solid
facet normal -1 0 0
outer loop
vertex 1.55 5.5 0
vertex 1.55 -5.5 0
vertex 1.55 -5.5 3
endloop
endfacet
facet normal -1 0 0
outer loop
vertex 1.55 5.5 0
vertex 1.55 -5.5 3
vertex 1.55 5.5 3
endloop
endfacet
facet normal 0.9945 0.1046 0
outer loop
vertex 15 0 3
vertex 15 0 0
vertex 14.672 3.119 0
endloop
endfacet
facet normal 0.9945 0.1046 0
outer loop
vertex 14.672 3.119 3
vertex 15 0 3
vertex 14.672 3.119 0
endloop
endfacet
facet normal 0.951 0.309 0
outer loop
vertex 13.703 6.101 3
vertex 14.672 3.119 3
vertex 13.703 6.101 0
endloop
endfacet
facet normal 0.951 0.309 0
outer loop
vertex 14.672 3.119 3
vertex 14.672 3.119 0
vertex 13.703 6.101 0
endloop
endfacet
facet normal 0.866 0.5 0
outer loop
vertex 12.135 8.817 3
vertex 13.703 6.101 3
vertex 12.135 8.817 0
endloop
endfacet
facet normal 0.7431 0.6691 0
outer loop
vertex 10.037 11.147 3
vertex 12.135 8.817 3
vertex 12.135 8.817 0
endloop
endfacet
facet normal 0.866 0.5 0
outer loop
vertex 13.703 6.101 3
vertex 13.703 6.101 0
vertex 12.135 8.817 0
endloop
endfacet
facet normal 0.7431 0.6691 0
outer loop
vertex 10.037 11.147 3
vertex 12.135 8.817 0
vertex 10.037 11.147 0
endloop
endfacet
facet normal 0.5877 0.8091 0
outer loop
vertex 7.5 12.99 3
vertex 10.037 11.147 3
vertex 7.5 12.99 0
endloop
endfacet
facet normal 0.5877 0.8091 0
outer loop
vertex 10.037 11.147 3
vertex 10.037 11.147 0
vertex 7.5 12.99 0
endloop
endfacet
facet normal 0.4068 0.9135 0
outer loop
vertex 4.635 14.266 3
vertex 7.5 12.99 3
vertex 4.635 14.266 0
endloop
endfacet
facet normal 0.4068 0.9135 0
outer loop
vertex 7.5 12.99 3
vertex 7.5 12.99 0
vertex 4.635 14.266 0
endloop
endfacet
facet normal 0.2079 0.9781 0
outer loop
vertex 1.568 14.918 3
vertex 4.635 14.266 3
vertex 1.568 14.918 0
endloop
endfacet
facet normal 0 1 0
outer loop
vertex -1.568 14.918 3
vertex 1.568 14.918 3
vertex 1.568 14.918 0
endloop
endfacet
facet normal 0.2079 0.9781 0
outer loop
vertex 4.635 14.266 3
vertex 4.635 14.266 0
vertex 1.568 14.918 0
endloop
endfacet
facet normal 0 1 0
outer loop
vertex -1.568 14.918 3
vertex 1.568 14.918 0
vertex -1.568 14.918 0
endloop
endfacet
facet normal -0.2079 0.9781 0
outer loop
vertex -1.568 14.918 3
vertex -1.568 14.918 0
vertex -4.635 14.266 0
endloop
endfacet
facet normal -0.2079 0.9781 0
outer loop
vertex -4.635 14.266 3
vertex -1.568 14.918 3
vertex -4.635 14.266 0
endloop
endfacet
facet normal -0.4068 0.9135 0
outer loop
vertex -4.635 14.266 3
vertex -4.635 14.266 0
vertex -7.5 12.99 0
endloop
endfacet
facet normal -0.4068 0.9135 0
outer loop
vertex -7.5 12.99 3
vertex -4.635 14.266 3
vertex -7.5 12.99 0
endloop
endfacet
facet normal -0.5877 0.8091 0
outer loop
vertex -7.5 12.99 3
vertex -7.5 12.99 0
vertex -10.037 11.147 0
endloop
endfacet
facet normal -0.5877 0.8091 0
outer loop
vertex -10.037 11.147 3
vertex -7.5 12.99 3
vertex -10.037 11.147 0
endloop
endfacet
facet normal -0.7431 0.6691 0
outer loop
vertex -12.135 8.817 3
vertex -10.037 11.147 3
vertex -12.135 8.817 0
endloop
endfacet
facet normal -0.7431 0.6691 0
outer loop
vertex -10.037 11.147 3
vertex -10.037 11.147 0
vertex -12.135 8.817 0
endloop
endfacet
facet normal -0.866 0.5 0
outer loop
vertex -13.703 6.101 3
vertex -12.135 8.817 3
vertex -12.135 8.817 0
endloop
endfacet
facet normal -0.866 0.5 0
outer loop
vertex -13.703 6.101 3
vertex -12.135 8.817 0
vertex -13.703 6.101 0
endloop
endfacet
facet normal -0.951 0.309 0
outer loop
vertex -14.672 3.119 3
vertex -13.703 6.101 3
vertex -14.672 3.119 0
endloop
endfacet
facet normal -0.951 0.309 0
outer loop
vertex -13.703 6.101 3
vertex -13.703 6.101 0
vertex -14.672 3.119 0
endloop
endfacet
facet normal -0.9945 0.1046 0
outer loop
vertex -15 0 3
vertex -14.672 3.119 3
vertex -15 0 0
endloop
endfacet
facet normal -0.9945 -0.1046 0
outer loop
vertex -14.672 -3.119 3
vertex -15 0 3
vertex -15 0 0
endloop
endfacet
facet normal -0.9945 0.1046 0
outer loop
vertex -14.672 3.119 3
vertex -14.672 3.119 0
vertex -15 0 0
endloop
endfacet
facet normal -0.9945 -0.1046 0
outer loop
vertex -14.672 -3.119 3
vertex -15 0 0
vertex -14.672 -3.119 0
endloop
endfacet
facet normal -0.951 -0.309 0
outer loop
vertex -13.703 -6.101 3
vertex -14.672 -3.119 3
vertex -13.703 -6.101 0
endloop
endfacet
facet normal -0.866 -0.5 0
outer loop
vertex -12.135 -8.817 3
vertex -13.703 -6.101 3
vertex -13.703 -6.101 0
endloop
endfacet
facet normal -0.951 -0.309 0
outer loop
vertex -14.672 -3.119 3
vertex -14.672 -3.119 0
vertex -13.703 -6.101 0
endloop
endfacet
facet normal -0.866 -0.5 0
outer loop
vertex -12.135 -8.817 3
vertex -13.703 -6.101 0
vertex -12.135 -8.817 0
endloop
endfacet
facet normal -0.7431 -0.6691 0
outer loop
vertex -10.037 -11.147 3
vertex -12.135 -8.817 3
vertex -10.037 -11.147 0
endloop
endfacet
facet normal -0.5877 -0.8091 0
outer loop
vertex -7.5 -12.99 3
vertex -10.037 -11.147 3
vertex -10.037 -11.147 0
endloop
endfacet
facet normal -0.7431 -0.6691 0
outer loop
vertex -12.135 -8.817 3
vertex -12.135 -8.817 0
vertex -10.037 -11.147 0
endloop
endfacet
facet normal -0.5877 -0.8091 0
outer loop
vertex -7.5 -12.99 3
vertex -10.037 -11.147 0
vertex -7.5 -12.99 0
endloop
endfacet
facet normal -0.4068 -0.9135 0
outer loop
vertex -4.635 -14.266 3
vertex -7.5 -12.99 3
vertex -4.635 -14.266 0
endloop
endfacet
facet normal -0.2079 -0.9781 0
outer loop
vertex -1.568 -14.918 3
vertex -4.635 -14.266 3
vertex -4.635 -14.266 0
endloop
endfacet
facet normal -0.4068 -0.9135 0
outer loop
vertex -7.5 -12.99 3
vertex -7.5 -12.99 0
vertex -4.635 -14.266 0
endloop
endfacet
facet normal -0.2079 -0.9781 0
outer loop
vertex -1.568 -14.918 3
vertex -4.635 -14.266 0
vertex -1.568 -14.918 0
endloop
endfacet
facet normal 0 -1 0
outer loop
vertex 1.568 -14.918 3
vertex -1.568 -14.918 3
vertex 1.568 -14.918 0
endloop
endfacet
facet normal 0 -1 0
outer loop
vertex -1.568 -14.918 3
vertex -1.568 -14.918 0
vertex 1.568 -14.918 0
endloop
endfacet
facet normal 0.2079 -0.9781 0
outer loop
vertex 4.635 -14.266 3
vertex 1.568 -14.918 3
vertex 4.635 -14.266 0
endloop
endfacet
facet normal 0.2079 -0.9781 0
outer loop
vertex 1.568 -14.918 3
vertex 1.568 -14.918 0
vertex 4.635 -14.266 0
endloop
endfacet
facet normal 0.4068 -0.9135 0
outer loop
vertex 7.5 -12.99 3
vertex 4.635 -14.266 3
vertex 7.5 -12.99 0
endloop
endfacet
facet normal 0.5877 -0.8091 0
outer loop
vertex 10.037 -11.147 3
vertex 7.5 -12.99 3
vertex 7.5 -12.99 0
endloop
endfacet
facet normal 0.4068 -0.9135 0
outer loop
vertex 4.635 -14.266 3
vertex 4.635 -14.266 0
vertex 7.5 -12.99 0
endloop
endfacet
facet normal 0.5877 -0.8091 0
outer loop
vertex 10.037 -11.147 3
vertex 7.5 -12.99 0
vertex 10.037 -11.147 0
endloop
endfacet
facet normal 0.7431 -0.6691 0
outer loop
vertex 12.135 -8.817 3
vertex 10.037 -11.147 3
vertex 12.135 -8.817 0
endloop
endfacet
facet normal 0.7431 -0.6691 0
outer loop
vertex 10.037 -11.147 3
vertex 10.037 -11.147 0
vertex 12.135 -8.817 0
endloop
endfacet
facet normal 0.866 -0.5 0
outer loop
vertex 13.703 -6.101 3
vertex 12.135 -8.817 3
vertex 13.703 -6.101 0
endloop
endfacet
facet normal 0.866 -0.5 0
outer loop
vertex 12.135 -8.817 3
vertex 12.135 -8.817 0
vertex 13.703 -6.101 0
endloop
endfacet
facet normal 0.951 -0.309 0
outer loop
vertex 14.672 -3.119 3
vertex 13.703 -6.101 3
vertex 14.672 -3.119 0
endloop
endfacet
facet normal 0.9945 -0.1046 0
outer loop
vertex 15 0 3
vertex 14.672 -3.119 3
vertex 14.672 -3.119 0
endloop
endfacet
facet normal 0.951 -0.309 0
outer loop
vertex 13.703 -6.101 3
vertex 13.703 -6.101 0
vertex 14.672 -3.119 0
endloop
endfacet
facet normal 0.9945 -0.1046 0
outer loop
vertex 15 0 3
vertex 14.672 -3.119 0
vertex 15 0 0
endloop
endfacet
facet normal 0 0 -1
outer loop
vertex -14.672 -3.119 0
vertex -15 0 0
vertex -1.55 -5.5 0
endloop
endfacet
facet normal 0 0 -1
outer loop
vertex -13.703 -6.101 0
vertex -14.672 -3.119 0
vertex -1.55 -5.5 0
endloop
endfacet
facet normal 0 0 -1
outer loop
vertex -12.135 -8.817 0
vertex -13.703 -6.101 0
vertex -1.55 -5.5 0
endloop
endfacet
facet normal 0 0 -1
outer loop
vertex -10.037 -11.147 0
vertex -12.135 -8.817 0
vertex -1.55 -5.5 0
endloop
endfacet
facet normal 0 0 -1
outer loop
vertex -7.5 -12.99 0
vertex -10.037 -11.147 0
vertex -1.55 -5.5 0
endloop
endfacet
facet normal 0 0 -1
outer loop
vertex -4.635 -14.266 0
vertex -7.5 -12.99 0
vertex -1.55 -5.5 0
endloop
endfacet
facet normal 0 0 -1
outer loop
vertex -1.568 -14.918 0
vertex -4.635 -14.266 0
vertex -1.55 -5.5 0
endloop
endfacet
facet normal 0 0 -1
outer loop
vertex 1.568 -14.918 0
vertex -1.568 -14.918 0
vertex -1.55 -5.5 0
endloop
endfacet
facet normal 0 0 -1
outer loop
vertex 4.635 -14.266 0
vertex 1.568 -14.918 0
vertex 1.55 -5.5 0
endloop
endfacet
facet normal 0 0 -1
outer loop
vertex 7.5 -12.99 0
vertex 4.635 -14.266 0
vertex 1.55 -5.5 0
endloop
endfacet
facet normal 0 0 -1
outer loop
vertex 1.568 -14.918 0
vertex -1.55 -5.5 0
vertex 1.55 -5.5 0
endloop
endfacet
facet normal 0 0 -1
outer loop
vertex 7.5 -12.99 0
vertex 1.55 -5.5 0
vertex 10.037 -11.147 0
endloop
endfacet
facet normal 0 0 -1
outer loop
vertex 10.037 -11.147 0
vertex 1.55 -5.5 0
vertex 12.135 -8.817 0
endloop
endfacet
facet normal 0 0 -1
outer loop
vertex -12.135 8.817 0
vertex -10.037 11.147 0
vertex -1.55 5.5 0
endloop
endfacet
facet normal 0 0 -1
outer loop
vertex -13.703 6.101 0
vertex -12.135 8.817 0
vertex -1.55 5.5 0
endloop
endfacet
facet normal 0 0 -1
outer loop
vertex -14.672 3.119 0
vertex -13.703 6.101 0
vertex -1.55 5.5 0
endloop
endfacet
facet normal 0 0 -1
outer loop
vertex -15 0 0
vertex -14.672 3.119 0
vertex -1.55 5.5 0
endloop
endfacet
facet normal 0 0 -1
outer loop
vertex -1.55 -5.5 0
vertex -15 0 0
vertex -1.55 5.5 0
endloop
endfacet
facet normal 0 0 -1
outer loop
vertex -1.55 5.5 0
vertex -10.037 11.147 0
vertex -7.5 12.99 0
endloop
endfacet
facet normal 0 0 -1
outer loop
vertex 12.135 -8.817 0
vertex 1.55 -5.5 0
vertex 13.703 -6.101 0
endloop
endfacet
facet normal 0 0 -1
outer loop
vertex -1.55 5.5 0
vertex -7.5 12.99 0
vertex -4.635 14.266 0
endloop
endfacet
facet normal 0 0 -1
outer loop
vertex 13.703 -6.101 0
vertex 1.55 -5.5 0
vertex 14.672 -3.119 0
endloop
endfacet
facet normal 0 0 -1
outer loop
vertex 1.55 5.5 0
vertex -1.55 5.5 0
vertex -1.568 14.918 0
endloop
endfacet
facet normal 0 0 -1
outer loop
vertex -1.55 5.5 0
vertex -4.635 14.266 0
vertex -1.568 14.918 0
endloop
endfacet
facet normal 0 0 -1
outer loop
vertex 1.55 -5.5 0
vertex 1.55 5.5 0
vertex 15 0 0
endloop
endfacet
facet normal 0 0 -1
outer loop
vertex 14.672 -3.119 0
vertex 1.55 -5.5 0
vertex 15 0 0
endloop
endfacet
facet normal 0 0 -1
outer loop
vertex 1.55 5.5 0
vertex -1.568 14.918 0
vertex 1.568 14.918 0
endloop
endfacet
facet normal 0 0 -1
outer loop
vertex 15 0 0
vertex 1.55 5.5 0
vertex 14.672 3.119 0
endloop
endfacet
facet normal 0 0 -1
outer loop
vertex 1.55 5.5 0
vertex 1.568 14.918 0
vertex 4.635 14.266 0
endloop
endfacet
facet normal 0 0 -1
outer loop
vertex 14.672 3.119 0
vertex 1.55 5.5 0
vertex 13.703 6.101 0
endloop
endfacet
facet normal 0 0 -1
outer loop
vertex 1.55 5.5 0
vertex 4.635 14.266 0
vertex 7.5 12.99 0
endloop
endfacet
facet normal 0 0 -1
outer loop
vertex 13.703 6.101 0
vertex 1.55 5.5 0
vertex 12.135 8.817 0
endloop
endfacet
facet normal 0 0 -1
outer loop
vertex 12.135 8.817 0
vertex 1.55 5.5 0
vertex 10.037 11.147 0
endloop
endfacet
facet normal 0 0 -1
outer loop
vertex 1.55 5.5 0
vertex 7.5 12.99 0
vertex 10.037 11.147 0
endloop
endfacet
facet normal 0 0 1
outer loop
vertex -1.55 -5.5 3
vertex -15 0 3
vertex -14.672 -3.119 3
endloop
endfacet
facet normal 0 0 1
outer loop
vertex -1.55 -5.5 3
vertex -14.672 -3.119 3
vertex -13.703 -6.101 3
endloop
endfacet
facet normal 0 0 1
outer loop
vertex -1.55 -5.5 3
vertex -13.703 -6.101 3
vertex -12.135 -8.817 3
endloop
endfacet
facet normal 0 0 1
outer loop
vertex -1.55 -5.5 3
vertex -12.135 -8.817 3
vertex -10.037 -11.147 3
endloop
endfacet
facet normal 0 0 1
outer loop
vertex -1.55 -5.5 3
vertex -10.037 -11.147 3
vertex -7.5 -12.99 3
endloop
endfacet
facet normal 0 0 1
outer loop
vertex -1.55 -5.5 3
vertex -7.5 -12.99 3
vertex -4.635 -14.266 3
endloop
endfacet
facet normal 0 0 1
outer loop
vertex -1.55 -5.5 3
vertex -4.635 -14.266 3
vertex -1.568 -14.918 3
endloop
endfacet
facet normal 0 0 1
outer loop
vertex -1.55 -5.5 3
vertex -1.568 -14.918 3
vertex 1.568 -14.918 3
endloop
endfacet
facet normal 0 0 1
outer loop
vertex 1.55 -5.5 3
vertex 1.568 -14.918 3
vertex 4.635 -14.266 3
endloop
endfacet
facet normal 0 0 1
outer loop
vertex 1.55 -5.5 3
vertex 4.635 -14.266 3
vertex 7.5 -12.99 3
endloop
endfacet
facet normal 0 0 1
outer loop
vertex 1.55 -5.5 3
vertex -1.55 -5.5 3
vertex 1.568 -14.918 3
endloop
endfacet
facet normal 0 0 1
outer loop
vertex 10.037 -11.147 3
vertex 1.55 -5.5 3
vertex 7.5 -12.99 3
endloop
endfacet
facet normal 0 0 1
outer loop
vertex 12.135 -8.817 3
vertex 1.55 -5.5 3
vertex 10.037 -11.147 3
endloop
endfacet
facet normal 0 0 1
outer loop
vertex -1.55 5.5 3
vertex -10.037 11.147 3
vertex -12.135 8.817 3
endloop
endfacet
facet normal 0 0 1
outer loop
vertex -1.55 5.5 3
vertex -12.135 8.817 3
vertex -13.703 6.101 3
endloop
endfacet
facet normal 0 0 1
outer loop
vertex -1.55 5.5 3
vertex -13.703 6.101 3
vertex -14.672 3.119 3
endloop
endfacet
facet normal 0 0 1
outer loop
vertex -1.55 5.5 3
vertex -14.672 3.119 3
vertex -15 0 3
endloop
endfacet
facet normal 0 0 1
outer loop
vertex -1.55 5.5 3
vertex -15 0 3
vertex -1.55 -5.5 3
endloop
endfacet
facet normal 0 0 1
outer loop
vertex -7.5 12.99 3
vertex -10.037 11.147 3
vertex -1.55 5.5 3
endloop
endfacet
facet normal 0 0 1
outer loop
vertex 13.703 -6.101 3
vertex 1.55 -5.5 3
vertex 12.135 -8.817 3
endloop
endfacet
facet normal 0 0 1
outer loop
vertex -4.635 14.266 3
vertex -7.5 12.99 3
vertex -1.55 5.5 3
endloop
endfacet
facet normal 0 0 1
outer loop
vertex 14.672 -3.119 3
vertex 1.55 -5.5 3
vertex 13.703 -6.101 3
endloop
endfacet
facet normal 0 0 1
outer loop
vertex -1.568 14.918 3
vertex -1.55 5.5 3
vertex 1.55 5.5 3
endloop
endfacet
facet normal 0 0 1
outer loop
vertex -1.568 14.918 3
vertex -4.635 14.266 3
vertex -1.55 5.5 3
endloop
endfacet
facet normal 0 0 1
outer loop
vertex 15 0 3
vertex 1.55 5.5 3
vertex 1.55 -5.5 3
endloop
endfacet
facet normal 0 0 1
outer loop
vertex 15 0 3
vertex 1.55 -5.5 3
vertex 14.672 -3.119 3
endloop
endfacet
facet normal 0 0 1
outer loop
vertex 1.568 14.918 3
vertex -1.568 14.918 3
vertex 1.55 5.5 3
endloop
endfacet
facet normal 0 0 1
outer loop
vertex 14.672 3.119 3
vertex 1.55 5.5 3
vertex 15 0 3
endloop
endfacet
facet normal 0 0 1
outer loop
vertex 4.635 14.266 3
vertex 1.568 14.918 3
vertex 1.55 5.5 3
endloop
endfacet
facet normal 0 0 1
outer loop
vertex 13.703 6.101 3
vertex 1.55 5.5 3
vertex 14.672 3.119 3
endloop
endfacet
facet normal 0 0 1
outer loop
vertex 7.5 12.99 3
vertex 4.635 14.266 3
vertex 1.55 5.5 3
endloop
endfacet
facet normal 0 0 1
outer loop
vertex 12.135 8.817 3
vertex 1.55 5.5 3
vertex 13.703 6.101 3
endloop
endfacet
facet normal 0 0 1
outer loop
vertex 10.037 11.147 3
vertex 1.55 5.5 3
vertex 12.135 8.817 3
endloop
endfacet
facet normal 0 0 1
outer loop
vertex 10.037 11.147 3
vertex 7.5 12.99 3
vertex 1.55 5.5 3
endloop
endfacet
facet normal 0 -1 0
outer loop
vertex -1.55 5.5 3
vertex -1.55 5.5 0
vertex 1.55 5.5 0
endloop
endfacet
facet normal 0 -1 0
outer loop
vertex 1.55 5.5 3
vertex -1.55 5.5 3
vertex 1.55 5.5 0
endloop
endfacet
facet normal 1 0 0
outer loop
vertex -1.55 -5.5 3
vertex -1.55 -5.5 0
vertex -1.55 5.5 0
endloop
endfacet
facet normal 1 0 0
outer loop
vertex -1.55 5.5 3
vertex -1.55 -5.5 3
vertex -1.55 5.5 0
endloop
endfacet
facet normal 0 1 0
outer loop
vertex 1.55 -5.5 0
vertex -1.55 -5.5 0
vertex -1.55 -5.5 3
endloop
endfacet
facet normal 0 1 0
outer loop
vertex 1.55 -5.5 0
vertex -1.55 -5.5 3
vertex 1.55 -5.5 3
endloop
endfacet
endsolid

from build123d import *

# Parameters (mm, degrees)
SKETCH1_R           = 15
BOSS_EXTRUDE1_DEPTH = 3
SKETCH3_W           = 3.1
SKETCH3_H           = 11
CUT_EXTRUDE1_DEPTH  = 3


with BuildPart() as part:
    # Sketch1 → Boss-Extrude1 (new body)
    with BuildSketch(Plane.XY):
        Circle(SKETCH1_R)
    extrude(amount=BOSS_EXTRUDE1_DEPTH)

    # Sketch3 → Cut-Extrude1 (cut)
    with BuildSketch(Plane.XY):
        Rectangle(SKETCH3_W, SKETCH3_H)
    extrude(amount=CUT_EXTRUDE1_DEPTH, mode=Mode.SUBTRACT)


solid = part.part
